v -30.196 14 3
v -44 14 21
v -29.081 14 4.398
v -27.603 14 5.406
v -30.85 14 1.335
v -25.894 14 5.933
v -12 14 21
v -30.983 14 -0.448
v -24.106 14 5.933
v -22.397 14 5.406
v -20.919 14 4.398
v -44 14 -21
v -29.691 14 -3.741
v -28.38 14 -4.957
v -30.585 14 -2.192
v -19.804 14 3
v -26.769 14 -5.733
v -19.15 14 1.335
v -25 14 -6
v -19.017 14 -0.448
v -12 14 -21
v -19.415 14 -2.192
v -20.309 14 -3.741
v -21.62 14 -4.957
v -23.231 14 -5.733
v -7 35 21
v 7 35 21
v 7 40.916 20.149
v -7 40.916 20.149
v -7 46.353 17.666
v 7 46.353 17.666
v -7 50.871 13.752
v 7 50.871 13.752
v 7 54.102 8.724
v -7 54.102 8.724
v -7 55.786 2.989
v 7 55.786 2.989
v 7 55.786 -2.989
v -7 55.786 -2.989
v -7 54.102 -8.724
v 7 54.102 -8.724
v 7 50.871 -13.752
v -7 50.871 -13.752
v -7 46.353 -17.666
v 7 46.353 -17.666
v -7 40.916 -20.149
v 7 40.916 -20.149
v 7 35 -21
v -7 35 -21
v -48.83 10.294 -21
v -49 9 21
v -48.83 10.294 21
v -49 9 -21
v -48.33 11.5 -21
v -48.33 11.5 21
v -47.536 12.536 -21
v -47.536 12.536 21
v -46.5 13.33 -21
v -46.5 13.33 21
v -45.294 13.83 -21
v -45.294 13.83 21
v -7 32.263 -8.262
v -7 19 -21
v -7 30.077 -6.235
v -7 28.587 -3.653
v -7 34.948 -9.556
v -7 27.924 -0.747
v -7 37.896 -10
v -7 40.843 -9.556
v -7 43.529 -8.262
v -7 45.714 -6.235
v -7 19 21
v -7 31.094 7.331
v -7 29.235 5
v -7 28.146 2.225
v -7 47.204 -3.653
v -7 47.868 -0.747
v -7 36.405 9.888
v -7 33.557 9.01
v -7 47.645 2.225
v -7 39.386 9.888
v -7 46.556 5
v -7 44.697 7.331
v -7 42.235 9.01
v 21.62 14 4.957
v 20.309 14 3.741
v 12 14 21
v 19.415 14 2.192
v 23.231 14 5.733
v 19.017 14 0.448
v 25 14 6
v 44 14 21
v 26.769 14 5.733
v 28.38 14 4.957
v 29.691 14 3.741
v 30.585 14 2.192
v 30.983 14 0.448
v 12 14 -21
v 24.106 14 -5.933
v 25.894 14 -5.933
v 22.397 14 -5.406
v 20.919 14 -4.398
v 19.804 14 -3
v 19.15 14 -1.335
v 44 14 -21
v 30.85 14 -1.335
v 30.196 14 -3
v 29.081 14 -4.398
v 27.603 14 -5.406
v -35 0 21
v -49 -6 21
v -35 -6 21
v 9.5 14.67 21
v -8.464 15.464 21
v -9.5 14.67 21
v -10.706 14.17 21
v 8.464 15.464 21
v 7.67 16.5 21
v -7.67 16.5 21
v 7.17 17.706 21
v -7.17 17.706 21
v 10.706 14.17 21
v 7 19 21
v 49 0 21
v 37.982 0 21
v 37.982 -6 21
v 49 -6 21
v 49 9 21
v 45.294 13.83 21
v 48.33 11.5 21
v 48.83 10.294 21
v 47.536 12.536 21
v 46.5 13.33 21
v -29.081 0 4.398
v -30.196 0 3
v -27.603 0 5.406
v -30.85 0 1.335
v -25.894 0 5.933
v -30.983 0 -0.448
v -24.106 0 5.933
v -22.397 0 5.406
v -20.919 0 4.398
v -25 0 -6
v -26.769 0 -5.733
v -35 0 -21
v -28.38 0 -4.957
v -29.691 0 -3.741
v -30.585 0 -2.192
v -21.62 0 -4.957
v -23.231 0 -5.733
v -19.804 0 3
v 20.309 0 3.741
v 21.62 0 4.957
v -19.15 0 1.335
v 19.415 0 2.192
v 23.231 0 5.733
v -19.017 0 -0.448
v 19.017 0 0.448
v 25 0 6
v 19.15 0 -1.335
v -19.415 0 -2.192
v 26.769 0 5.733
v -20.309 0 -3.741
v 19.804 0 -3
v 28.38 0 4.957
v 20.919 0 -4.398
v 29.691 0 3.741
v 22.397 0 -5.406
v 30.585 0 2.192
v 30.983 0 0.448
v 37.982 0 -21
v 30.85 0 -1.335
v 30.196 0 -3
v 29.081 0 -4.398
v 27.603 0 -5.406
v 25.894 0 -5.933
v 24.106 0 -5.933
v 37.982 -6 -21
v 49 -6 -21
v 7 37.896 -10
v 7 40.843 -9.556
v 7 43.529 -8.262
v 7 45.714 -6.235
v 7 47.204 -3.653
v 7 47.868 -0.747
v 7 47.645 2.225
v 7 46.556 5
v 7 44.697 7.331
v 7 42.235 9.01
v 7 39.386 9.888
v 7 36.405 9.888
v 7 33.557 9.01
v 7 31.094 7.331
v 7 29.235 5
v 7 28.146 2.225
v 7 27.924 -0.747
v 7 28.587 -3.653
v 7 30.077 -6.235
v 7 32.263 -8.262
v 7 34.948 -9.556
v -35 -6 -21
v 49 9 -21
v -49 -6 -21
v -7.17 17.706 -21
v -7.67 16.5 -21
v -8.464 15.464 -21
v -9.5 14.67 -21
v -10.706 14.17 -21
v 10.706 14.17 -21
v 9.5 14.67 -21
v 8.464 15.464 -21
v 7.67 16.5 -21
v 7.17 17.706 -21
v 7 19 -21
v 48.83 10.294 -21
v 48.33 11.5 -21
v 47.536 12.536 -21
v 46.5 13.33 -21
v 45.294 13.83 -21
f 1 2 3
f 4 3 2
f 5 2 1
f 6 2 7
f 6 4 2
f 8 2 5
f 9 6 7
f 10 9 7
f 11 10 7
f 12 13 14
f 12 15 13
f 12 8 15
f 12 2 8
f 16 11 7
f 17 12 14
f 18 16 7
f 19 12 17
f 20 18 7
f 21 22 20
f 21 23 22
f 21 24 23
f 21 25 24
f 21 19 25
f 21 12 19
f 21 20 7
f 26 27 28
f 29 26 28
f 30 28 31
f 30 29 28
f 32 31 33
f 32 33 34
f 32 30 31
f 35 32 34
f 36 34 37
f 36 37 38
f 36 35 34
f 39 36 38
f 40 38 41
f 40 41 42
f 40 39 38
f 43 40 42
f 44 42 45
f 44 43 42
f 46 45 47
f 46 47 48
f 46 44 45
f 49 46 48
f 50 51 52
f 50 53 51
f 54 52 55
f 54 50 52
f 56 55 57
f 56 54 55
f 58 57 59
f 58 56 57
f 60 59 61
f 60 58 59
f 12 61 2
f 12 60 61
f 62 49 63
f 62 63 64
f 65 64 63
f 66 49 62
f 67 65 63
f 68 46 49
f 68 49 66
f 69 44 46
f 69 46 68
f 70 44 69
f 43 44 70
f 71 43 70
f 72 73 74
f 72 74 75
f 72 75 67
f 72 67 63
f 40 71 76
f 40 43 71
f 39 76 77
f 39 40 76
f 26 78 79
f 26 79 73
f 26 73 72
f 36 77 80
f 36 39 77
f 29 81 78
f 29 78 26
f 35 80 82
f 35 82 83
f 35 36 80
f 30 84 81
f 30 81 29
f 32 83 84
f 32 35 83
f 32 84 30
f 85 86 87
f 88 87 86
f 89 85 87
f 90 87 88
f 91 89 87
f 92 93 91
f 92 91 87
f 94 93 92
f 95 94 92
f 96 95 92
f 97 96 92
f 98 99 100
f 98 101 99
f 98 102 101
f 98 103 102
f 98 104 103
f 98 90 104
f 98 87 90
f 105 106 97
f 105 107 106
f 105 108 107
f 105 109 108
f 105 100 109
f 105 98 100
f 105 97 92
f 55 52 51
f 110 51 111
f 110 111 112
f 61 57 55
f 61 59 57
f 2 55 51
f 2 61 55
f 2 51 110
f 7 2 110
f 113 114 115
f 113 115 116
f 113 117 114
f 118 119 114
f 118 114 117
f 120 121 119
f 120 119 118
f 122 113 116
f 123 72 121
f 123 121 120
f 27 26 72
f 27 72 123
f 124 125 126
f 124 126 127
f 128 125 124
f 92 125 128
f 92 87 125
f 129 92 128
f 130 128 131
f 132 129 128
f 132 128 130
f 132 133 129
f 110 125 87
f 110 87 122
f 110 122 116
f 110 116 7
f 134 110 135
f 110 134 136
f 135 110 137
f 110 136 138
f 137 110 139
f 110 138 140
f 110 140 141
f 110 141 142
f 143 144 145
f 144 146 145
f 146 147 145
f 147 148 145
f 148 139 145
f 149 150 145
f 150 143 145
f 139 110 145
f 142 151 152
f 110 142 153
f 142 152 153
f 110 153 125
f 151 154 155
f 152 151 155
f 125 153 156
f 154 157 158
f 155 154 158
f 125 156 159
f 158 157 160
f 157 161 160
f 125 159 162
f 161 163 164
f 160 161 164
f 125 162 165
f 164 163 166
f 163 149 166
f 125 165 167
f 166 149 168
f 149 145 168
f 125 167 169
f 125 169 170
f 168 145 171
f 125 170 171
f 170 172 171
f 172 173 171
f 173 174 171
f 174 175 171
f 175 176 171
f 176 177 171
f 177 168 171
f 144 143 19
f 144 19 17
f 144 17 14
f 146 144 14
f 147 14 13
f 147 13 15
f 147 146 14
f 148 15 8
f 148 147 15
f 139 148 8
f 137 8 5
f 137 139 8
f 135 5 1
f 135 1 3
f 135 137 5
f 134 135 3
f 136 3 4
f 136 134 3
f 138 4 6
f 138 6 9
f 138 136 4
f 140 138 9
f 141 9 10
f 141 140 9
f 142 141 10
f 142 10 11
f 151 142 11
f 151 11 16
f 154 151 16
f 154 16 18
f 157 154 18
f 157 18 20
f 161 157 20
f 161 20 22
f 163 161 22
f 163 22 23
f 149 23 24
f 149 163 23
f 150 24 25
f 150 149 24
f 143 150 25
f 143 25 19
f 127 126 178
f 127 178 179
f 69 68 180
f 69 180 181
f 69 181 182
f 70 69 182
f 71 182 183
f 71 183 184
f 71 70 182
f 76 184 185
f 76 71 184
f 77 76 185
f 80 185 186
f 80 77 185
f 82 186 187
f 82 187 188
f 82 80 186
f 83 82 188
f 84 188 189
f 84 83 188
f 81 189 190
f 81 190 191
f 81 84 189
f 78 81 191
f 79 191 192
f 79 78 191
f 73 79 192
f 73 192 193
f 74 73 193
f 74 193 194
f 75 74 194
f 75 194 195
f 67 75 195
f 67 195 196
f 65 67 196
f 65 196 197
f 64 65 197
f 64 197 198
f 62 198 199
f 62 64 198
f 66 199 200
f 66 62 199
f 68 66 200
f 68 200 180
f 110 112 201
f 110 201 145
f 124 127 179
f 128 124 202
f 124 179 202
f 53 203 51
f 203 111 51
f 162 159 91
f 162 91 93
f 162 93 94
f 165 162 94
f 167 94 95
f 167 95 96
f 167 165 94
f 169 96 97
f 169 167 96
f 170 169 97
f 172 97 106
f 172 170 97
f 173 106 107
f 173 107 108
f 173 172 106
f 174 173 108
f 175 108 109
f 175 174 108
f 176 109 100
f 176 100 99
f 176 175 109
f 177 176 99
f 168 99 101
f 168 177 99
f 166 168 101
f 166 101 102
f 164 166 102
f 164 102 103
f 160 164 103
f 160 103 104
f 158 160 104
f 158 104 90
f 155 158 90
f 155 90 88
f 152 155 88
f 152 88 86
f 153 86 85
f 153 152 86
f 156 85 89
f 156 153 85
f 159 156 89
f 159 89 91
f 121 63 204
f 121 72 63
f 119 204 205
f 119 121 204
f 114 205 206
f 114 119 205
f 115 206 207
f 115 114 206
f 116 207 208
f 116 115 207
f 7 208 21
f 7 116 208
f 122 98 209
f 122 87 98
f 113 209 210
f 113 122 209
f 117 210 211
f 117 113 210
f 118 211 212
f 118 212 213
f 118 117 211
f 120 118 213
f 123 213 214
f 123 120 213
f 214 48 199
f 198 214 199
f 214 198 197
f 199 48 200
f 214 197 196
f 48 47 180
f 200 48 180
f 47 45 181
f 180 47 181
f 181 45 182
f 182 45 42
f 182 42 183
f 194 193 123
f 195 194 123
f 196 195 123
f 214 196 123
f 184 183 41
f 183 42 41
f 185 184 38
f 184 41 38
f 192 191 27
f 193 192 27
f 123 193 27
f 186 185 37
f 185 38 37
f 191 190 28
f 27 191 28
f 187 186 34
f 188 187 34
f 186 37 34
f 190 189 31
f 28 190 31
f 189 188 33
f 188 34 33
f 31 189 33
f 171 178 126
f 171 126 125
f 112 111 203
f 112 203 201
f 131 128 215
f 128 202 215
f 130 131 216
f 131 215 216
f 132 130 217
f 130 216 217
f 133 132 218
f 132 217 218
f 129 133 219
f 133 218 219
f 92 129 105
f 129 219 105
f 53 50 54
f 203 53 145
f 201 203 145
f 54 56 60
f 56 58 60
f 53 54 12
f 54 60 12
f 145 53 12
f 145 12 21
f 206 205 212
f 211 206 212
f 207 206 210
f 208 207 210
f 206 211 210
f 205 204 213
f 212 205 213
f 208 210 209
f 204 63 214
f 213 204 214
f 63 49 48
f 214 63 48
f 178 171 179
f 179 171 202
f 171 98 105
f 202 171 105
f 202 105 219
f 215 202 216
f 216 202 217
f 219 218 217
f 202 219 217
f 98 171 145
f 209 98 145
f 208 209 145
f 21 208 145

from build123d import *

# Parameters (mm, degrees)
SKETCH1_W                = 98
SKETCH1_H                = 42
BOSS_EXTRUDE1_DEPTH      = 14
BOSS_EXTRUDE2_DEPTH      = 21
BOSS_EXTRUDE2_DEPTH_BACK = 21
SKETCH2_W                = 11.017552575
SKETCH2_H                = 6
FILLET1_R                = 5
SKETCH3_W                = 14
SKETCH3_H                = 6
BOSS_EXTRUDE3_DEPTH      = 42
FILLET2_R                = 5
SKETCH4_R                = 6
CUT_EXTRUDE1_DEPTH       = 14
BOSS_EXTRUDE4_DEPTH      = 7
BOSS_EXTRUDE4_DEPTH_BACK = 7
SKETCH5_R                = 10
FILLET3_R                = 5
FILLET4_R                = 5


with BuildPart() as part:
    # Sketch1 → Boss-Extrude1 (new body)
    with BuildSketch(Plane(origin=(0, 0, 0), x_dir=(1, 0, 0), z_dir=(0, 1, 0))):
        Rectangle(SKETCH1_W, SKETCH1_H)
    extrude(amount=BOSS_EXTRUDE1_DEPTH)

    # Sketch2 → Boss-Extrude2 (add, two sides: drawn at the far end of the back side and taken through both)
    with BuildSketch(Plane.XY.offset(-BOSS_EXTRUDE2_DEPTH_BACK)):
        with Locations((43.491223713, -3)):
            Rectangle(SKETCH2_W, SKETCH2_H)
    extrude(amount=BOSS_EXTRUDE2_DEPTH + BOSS_EXTRUDE2_DEPTH_BACK)

    # Fillet1
    fillet1_edges = [part.edges().sort_by_distance(p)[0] for p in [
        (49, 14, 0),
    ]]
    fillet(fillet1_edges, radius=FILLET1_R)

    # Sketch3 → Boss-Extrude3 (add)
    with BuildSketch(Plane.XY.offset(21)):
        with Locations((-42, -3)):
            Rectangle(SKETCH3_W, SKETCH3_H)
    extrude(amount=-BOSS_EXTRUDE3_DEPTH)

    # Fillet2
    fillet2_edges = [part.edges().sort_by_distance(p)[0] for p in [
        (-49, 14, 0),
    ]]
    fillet(fillet2_edges, radius=FILLET2_R)

    # Sketch4 → Cut-Extrude1 (cut)
    with BuildSketch(Plane(origin=(0, 0, 0), x_dir=(1, 0, 0), z_dir=(0, 1, 0))):
        with Locations((25, 0)):
            Circle(SKETCH4_R)
        with Locations((-25, 0)):
            Circle(SKETCH4_R)
    extrude(amount=CUT_EXTRUDE1_DEPTH, mode=Mode.SUBTRACT)

    # Sketch5 → Boss-Extrude4 (add, two sides: drawn at the far end of the back side and taken through both)
    with BuildSketch(Plane(origin=(0, 0, 0), x_dir=(0, 0, -1), z_dir=(1, 0, 0)).offset(-BOSS_EXTRUDE4_DEPTH_BACK)):
        with BuildLine():
            Line((-21, 14), (-21, 35))
            ThreePointArc((-21, 35), (0, 56), (21, 35))
            Line((21, 35), (21, 14))
            Line((21, 14), (-21, 14))
        make_face()
        with Locations((0, 37.895751368)):
            Circle(SKETCH5_R, mode=Mode.SUBTRACT)
    extrude(amount=BOSS_EXTRUDE4_DEPTH + BOSS_EXTRUDE4_DEPTH_BACK)

    # Fillet3
    fillet3_edges = [part.edges().sort_by_distance(p)[0] for p in [
        (7, 14, 0),
    ]]
    fillet(fillet3_edges, radius=FILLET3_R)

    # Fillet4
    fillet4_edges = [part.edges().sort_by_distance(p)[0] for p in [
        (-7, 14, 0),
    ]]
    fillet(fillet4_edges, radius=FILLET4_R)


solid = part.part
